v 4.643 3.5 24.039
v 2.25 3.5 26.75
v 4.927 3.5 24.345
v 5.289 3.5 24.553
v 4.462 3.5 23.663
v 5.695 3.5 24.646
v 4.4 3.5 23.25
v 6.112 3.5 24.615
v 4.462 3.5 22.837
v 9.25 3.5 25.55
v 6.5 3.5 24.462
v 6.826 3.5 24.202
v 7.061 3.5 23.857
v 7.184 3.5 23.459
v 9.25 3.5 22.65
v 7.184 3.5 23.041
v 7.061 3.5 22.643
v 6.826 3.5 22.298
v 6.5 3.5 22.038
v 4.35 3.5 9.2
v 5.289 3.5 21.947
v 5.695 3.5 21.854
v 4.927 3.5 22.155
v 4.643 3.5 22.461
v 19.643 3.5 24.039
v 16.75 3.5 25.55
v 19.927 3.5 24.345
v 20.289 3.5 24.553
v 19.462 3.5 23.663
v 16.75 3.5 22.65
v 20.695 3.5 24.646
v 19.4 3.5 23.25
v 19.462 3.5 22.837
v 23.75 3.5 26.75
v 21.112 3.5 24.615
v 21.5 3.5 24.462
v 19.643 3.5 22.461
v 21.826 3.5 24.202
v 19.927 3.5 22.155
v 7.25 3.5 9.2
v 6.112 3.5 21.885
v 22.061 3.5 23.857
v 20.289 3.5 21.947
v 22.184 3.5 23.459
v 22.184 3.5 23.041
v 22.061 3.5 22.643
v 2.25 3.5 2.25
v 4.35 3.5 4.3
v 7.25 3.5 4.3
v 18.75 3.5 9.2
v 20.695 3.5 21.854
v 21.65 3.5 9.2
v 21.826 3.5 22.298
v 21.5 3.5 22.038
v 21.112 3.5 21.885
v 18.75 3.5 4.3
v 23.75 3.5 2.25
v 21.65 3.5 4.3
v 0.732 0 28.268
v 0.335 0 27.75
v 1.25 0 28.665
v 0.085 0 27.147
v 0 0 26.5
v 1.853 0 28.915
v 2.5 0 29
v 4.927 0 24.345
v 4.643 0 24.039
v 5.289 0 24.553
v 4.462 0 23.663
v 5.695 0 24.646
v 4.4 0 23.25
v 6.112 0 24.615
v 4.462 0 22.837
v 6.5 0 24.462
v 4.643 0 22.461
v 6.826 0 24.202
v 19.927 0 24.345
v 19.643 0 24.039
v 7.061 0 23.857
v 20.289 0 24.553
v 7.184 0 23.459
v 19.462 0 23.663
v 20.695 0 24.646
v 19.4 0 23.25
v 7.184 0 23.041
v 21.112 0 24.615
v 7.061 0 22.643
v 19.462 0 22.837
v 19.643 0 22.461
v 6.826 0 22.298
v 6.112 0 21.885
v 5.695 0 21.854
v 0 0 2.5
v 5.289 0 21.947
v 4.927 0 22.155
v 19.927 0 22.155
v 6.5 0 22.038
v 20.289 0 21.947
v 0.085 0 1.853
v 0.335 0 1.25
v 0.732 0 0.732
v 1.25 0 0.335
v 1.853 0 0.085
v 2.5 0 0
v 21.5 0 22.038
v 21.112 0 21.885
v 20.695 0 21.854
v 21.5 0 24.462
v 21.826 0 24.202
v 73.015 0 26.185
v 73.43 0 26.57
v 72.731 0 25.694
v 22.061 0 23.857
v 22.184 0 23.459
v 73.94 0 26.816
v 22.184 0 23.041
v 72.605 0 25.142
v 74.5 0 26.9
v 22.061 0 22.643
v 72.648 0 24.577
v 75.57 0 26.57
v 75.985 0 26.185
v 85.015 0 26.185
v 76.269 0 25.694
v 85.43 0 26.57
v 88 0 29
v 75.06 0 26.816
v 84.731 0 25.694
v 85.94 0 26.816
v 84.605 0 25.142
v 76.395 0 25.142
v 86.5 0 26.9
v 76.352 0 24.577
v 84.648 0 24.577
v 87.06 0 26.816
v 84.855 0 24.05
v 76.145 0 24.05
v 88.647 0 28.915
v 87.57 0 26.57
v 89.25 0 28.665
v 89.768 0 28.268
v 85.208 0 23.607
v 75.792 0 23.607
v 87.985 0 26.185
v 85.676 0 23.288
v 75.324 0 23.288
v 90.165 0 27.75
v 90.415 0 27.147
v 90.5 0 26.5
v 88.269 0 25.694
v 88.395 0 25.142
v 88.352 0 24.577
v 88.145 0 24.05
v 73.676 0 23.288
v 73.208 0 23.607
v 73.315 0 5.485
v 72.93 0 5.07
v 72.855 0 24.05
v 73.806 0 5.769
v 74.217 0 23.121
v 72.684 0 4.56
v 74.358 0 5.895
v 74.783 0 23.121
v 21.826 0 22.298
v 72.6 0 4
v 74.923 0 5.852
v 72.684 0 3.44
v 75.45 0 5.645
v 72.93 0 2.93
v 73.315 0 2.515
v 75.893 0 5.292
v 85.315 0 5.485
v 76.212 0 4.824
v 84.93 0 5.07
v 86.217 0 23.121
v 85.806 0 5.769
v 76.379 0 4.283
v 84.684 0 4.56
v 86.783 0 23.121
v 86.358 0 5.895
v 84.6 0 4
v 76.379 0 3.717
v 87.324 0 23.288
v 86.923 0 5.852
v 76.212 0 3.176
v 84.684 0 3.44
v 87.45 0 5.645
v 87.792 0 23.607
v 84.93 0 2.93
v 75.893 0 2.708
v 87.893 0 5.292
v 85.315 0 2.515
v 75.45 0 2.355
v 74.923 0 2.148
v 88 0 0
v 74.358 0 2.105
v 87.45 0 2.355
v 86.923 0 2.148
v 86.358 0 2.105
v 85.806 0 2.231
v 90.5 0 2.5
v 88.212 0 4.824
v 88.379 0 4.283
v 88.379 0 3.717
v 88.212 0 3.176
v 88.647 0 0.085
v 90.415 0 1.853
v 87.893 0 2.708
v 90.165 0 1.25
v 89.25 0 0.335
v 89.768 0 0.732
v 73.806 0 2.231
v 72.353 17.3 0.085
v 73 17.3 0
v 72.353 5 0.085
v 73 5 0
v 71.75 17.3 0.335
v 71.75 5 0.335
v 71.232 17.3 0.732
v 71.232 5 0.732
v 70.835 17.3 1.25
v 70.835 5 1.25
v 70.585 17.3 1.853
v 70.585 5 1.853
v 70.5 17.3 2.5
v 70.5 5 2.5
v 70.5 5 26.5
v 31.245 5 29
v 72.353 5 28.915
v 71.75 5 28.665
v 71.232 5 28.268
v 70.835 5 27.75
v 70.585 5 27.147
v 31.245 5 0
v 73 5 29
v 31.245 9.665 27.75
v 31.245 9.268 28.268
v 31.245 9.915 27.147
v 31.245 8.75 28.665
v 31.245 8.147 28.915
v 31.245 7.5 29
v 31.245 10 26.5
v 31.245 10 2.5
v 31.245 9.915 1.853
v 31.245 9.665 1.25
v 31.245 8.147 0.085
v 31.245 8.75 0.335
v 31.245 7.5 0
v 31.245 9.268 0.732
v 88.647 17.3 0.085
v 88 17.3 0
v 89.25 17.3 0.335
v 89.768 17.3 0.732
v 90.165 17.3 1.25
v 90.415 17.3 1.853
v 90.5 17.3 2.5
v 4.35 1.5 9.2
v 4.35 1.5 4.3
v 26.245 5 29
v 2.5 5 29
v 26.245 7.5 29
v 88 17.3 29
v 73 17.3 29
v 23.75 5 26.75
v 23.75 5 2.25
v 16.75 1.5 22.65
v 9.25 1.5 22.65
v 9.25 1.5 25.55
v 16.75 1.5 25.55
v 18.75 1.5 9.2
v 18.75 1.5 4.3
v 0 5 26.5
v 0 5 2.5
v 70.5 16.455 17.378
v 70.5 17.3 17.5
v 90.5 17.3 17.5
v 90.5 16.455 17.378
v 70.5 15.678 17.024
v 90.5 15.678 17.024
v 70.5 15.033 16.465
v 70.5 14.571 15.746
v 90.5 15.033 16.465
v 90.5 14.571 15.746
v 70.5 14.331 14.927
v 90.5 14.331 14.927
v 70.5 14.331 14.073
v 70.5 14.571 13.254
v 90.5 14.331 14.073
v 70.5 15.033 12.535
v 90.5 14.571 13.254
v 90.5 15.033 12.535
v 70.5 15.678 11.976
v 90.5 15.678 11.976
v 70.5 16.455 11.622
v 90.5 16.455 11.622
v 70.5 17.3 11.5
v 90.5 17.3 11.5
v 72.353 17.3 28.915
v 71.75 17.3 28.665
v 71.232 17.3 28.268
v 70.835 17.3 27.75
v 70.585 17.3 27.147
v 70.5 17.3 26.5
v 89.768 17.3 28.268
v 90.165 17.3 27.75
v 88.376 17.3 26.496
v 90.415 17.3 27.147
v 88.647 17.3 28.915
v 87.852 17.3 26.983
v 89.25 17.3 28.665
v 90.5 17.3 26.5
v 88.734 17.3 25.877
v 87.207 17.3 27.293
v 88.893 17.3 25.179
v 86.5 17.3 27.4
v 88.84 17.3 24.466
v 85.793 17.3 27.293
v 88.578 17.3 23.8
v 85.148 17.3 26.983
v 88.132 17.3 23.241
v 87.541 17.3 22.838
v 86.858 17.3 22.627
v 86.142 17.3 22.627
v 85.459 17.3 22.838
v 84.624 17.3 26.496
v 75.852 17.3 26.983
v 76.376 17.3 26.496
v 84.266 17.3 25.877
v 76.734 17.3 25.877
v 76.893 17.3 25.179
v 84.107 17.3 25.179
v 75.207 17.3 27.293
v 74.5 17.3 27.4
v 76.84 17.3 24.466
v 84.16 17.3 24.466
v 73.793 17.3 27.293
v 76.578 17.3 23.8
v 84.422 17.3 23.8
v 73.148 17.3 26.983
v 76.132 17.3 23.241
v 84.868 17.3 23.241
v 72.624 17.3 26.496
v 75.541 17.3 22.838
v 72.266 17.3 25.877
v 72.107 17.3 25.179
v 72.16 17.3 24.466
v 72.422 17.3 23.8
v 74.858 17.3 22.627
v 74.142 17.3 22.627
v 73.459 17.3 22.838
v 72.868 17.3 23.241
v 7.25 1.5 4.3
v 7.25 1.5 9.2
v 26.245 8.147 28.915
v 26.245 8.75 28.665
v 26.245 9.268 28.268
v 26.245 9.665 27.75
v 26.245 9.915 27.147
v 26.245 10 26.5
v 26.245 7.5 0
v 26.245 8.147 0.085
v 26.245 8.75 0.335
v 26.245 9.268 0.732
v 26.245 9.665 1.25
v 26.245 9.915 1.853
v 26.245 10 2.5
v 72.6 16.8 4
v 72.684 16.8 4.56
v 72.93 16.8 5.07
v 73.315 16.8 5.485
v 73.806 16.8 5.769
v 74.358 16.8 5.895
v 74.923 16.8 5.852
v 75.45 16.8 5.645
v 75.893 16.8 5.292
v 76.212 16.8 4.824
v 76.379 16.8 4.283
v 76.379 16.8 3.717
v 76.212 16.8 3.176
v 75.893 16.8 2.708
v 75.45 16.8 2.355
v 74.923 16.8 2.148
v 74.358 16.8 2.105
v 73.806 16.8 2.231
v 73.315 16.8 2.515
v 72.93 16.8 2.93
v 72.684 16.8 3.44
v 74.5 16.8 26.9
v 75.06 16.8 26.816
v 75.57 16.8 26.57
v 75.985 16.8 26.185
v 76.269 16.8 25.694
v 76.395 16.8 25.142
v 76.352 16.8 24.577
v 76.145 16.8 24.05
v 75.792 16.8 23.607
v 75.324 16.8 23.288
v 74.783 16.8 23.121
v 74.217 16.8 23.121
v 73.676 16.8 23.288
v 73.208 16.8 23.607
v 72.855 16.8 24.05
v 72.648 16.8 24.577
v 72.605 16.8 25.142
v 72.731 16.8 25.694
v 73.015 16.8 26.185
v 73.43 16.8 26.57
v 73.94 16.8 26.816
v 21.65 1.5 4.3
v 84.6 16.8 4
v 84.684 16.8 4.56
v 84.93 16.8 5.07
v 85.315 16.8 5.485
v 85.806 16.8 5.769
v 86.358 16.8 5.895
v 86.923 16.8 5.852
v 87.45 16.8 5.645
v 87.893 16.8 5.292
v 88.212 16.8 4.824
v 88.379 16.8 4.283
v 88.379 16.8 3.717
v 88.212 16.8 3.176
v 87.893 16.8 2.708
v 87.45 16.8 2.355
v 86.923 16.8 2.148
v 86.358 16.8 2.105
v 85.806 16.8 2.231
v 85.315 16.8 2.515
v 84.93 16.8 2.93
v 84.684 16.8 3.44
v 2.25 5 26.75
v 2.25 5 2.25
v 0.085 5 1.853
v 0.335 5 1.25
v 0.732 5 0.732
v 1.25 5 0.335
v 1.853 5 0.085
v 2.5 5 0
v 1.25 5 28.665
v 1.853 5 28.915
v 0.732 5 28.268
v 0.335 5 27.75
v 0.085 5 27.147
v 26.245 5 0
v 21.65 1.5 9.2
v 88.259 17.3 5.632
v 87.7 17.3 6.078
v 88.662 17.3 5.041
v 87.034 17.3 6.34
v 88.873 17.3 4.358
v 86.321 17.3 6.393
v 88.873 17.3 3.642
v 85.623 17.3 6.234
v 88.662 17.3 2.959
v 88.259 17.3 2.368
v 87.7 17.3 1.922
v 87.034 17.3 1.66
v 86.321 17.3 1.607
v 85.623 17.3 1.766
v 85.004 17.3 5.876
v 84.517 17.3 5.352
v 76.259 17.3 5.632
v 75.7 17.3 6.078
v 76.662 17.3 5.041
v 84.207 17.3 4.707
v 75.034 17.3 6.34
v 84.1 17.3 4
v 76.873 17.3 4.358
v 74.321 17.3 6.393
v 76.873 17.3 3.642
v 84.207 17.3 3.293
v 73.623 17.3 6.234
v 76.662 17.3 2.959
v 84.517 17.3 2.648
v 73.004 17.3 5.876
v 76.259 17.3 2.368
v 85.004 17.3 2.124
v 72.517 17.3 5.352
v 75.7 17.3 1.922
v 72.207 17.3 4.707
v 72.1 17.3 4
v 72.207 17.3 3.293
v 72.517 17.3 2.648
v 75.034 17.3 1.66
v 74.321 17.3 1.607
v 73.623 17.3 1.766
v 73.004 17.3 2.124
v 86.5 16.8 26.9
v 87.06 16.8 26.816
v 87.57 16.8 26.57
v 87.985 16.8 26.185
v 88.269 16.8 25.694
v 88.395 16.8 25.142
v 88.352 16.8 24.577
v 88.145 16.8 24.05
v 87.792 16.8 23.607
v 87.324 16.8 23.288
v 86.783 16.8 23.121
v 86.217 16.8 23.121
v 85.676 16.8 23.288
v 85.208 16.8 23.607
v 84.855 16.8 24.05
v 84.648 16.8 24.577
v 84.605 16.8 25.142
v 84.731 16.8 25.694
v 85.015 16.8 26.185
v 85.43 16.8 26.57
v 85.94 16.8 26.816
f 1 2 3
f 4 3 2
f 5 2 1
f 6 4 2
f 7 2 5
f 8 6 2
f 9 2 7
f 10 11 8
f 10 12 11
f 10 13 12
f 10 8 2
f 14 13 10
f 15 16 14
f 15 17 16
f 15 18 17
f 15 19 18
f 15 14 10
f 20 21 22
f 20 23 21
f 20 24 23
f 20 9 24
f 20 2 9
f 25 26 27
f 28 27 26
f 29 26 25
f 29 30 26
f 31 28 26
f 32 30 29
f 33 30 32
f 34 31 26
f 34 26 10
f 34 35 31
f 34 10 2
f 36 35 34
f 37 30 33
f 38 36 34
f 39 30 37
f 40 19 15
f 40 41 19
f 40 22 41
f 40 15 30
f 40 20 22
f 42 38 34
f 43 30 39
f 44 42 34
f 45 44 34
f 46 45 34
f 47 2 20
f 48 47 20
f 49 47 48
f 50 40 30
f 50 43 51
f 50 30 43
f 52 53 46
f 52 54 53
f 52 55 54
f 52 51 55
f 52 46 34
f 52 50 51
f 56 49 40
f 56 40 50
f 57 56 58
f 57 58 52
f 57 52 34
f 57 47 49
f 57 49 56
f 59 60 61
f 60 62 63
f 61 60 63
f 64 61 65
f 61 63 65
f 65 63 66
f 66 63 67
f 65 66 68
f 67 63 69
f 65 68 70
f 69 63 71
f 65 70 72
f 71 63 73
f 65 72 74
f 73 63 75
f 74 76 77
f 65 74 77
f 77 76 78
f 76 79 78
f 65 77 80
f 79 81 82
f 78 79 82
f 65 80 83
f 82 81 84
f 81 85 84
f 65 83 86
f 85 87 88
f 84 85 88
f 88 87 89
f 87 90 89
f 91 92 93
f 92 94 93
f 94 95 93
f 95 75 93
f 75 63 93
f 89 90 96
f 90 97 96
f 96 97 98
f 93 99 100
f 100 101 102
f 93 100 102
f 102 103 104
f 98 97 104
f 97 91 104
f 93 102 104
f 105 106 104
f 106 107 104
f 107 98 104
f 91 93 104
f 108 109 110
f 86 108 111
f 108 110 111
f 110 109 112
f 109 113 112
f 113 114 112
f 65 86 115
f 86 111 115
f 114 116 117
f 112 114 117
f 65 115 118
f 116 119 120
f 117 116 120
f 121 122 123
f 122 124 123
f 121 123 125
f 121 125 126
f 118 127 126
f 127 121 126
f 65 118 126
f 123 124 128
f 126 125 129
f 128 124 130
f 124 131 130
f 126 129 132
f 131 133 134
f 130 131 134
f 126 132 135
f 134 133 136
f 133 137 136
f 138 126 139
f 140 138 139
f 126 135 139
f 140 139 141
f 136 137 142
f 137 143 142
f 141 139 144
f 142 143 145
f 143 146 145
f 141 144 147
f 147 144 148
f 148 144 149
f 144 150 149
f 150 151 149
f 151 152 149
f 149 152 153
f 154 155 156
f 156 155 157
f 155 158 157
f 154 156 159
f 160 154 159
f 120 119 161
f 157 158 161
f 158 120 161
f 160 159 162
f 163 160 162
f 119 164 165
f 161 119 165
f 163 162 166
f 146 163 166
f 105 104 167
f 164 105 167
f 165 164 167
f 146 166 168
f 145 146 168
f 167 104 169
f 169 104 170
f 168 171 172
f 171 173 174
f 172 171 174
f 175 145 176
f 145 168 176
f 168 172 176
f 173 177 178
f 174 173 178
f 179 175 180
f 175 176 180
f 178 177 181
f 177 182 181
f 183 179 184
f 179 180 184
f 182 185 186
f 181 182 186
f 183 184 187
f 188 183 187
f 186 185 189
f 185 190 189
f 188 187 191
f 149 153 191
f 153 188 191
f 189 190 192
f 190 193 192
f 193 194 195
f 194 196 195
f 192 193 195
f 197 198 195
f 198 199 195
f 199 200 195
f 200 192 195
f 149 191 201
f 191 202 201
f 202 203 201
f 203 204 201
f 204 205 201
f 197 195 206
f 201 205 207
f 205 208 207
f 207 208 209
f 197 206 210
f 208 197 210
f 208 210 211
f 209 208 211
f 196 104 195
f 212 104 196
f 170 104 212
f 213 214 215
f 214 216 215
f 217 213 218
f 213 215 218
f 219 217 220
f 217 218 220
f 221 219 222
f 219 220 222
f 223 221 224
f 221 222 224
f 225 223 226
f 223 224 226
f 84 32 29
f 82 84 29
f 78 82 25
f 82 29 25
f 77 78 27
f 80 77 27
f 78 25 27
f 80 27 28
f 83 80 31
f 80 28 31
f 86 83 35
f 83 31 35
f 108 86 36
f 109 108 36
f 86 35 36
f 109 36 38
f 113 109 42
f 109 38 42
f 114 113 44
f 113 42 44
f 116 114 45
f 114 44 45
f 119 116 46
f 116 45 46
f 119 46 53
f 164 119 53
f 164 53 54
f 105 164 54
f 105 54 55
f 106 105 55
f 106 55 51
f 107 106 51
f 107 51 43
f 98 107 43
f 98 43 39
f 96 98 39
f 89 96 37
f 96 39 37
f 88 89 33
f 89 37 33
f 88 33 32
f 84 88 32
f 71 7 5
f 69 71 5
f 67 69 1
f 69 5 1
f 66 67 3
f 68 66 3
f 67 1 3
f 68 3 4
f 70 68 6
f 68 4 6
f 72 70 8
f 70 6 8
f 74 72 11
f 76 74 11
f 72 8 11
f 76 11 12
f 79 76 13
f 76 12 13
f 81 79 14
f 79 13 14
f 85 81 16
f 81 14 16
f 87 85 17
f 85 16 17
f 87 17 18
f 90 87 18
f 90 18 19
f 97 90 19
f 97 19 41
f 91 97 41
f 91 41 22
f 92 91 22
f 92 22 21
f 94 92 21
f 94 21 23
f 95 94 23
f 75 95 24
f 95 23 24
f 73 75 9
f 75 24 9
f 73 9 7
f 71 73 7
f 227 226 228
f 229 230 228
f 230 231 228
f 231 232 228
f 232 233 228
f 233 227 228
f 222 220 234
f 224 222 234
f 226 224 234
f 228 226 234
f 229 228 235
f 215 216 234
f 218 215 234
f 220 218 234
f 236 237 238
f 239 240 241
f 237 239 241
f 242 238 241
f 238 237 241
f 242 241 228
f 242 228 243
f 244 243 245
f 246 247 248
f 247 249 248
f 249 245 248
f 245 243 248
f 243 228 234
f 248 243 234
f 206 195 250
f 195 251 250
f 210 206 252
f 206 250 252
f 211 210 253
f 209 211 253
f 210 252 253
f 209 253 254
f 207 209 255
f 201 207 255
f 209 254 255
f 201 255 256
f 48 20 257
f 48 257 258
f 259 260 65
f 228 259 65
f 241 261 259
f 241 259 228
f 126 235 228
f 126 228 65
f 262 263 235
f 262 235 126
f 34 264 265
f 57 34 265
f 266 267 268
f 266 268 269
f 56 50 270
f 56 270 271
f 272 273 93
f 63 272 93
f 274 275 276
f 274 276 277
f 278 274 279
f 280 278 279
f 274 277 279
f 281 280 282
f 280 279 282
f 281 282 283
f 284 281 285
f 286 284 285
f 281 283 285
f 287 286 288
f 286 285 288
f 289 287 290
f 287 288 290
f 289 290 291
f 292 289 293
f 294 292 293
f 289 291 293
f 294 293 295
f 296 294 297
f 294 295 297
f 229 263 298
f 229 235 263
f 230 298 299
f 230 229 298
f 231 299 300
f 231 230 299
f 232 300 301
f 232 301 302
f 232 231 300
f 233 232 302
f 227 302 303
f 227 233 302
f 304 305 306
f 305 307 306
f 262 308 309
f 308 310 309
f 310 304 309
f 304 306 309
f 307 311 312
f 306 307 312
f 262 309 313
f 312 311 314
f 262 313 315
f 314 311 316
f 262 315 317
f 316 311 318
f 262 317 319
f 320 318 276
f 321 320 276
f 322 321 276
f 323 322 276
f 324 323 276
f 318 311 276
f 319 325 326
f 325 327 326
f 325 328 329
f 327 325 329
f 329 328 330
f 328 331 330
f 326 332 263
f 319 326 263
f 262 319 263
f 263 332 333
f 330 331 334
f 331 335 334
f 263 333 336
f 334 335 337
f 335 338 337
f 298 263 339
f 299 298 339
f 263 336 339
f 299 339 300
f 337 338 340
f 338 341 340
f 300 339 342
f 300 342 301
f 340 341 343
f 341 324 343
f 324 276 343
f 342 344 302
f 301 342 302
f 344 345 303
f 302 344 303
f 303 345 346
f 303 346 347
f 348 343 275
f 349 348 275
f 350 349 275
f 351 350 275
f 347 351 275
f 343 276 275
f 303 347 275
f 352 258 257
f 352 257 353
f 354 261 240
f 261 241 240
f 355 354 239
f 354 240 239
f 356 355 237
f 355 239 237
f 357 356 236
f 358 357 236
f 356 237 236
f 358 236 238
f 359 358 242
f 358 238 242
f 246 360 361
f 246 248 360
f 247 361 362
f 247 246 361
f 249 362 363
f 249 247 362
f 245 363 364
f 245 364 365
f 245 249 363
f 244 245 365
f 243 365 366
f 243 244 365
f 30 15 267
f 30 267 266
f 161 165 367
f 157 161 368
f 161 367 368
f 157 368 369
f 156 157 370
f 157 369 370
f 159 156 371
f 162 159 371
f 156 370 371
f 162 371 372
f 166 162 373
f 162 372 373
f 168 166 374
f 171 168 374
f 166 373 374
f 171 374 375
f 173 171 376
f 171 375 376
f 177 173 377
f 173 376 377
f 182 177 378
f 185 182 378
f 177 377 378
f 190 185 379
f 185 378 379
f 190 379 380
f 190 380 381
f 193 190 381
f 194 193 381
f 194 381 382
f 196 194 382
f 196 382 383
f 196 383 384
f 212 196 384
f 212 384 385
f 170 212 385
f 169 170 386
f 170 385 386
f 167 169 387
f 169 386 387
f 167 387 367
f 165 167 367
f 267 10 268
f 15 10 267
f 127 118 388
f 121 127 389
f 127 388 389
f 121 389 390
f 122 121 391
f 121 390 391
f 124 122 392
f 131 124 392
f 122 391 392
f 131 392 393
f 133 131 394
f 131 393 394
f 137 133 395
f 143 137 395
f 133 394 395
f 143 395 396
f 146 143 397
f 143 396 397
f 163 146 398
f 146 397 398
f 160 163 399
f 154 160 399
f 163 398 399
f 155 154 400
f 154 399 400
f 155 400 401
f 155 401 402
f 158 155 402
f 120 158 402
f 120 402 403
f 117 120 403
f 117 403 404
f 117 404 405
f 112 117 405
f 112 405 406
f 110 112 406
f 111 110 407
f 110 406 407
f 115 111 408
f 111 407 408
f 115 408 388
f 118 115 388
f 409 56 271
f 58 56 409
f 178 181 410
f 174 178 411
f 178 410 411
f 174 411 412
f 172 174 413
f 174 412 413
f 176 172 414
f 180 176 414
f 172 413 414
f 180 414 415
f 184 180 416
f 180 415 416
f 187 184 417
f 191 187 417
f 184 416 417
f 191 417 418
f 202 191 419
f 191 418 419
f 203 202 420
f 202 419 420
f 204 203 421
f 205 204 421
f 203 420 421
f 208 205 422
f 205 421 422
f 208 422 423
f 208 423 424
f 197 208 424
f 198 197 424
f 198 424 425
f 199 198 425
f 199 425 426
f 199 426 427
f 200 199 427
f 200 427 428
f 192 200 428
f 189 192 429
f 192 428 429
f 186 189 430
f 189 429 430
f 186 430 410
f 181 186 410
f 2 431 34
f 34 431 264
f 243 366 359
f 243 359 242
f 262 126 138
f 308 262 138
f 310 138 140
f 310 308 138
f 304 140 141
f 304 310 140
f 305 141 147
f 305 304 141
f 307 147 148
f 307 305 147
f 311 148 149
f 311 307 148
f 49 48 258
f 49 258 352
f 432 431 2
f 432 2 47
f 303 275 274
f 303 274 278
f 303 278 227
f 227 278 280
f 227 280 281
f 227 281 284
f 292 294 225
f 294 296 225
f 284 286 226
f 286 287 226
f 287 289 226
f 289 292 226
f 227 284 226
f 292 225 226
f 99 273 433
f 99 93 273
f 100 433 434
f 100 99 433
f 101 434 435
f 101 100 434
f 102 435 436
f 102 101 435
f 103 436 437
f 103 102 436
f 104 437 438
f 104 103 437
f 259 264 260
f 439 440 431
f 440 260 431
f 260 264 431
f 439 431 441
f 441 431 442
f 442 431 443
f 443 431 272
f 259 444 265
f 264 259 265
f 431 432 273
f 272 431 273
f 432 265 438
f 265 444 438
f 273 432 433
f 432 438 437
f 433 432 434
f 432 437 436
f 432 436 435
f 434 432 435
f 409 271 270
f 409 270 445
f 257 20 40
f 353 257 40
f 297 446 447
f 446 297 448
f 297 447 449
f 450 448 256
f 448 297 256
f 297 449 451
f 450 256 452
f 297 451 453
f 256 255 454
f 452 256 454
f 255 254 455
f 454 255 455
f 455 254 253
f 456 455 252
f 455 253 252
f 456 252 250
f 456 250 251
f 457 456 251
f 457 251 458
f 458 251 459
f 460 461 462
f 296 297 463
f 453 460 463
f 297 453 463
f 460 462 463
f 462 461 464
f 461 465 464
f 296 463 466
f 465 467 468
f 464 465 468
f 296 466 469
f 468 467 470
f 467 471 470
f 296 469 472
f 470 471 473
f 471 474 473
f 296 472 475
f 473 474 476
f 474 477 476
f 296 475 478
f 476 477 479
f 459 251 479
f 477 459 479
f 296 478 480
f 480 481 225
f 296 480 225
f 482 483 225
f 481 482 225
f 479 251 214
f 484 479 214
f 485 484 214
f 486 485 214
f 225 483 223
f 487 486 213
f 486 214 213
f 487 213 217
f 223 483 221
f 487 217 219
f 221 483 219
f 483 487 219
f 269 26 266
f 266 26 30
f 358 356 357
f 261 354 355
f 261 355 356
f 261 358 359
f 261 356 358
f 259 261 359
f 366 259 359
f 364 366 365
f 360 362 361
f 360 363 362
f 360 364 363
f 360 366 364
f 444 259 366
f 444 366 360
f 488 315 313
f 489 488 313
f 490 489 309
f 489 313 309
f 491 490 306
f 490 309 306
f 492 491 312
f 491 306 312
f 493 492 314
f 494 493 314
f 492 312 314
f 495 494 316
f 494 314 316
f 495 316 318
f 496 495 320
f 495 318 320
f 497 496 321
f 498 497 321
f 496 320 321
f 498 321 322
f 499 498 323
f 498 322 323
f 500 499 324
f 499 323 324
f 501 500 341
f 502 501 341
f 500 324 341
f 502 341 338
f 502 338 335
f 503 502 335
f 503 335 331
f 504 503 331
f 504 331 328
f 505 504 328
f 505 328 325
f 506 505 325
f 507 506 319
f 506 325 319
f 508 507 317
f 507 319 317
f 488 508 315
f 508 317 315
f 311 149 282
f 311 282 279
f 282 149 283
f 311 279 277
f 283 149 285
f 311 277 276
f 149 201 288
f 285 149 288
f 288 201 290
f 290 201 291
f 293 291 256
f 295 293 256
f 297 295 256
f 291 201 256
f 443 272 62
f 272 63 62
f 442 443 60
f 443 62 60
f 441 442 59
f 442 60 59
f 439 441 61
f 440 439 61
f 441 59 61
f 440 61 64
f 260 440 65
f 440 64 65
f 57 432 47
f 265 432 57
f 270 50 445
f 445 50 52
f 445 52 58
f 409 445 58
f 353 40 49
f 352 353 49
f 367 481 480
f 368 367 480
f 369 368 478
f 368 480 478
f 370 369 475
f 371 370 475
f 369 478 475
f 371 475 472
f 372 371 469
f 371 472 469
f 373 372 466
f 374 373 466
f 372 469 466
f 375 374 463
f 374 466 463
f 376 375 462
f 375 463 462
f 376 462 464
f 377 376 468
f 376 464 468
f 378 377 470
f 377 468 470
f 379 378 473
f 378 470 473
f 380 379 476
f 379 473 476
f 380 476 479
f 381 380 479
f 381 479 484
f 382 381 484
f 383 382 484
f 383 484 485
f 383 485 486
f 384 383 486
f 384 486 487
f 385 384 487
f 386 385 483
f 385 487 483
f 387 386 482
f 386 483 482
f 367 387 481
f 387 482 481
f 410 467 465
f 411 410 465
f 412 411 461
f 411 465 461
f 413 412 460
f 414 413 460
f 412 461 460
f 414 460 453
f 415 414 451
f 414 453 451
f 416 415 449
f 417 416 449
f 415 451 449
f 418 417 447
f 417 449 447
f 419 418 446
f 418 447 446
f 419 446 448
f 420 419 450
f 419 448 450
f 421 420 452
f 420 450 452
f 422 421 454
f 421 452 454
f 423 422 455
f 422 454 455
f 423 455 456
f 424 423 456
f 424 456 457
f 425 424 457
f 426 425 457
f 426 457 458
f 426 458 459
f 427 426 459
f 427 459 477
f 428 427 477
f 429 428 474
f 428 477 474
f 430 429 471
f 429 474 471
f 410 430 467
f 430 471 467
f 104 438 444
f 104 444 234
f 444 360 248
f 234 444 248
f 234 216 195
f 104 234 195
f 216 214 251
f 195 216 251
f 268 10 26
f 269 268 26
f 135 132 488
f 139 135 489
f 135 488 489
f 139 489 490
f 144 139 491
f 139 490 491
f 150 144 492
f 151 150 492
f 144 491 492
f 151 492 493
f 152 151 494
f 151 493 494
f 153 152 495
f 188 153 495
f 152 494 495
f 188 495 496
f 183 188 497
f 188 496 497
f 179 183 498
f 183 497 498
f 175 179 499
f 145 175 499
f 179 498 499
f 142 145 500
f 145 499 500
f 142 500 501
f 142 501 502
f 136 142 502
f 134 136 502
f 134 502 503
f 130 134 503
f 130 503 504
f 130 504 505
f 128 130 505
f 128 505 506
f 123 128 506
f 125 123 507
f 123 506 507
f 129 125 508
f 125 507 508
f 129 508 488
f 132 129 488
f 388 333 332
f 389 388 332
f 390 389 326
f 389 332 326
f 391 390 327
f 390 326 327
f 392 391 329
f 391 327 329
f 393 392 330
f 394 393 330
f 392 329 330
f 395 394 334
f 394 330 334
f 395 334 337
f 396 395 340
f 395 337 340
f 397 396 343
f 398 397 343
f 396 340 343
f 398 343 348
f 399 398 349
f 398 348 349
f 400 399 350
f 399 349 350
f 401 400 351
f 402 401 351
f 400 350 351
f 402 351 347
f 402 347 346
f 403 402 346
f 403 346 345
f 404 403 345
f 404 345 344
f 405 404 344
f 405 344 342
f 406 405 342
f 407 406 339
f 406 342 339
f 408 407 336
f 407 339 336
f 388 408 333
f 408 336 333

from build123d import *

# Parameters (mm, degrees)
P_IDAT_VYSUNUT_M1_DEPTH  = 29
SKICA2_W                 = 21.5
SKICA2_H                 = 24.5
ODEBRAT_VYSUNUT_M1_DEPTH = 1.5
SKICA3_R                 = 1.4
ODEBRAT_VYSUNUT_M2_DEPTH = 3.5
SKICA6_W                 = 2.9
SKICA6_H                 = 4.9
SKICA6_W_2               = 7.5
SKICA6_H_2               = 2.9
ODEBRAT_VYSUNUT_M5_DEPTH = 2
ZAOBLIT1_R               = 2.5
ZAOBLIT2_R               = 2.5
SKICA10_R                = 1.9
ODEBRAT_VYSUNUT_M7_DEPTH = 17.3
SKICA20_R                = 3
ODEBRAT_VYSUNUT_M8_DEPTH = 20
ZKOSEN_1_SIZE            = 0.5
SKICA21_W                = 5
SKICA21_H                = 29
P_IDAT_VYSUNUT_M2_DEPTH  = 5
ZAOBLIT4_R               = 2.5


with BuildPart() as part:
    # Skica1 → Přidat vysunutím1 (new body)
    with BuildSketch(Plane.XY):
        Polygon((0, 0), (90.5, 0), (90.5, 17.3), (70.5, 17.3), (70.5, 5), (0, 5), align=None)
    extrude(amount=P_IDAT_VYSUNUT_M1_DEPTH)

    # Skica2 → Odebrat vysunutím1 (cut)
    with BuildSketch(Plane(origin=(0, 5, 0), x_dir=(1, 0, 0), z_dir=(0, 1, 0))):
        with Locations((13, -14.5)):
            Rectangle(SKICA2_W, SKICA2_H)
    extrude(amount=-ODEBRAT_VYSUNUT_M1_DEPTH, mode=Mode.SUBTRACT)

    # Skica3 → Odebrat vysunutím2 (cut)
    with BuildSketch(Plane(origin=(0, 3.5, 0), x_dir=(1, 0, 0), z_dir=(0, 1, 0))):
        with Locations(Location((20.8, -23.25, 0), (0, 0, 180))):
            Circle(SKICA3_R)
        with Locations(Location((5.8, -23.25, 0), (0, 0, 180))):
            Circle(SKICA3_R)
    extrude(amount=-ODEBRAT_VYSUNUT_M2_DEPTH, mode=Mode.SUBTRACT)

    # Skica6 → Odebrat vysunutím5 (cut)
    with BuildSketch(Plane(origin=(0, 3.5, 0), x_dir=(1, 0, 0), z_dir=(0, 1, 0))):
        with Locations((5.8, -6.75)):
            Rectangle(SKICA6_W, SKICA6_H)
        with Locations((20.2, -6.75)):
            Rectangle(SKICA6_W, SKICA6_H)
        with Locations((13, -24.1)):
            Rectangle(SKICA6_W_2, SKICA6_H_2)
    extrude(amount=-ODEBRAT_VYSUNUT_M5_DEPTH, mode=Mode.SUBTRACT)

    # Zaoblit1
    zaoblit1_edges = [part.edges().sort_by_distance(p)[0] for p in [
        (0, 2.5, 29),
        (0, 2.5, 0),
    ]]
    fillet(zaoblit1_edges, radius=ZAOBLIT1_R)

    # Zaoblit2
    zaoblit2_edges = [part.edges().sort_by_distance(p)[0] for p in [
        (90.5, 8.65, 29),
        (70.5, 11.15, 29),
        (70.5, 11.15, 0),
        (90.5, 8.65, 0),
    ]]
    fillet(zaoblit2_edges, radius=ZAOBLIT2_R)

    # Skica10 → Odebrat vysunutím7 (cut)
    with BuildSketch(Plane(origin=(0, 17.3, 0), x_dir=(1, 0, 0), z_dir=(0, 1, 0))):
        with Locations(Location((74.5, -4, 0), (0, 0, 180))):
            Circle(SKICA10_R)
        with Locations(Location((86.5, -4, 0), (0, 0, 180))):
            Circle(SKICA10_R)
        with Locations(Location((86.5, -25, 0), (0, 0, 270))):
            Circle(SKICA10_R)
        with Locations(Location((74.5, -25, 0), (0, 0, 270))):
            Circle(SKICA10_R)
    extrude(amount=-ODEBRAT_VYSUNUT_M7_DEPTH, mode=Mode.SUBTRACT)

    # Skica20 → Odebrat vysunutím8 (cut)
    with BuildSketch(Plane(origin=(90.5, 0, 0), x_dir=(0, 0, -1), z_dir=(1, 0, 0))):
        with Locations((-14.5, 17.3)):
            Circle(SKICA20_R)
    extrude(amount=-ODEBRAT_VYSUNUT_M8_DEPTH, mode=Mode.SUBTRACT)

    # Zkosení1
    zkosen_1_edges = [part.edges().sort_by_distance(p)[0] for p in [
        (74.5, 17.3, 23.1),
        (86.5, 17.3, 23.1),
        (88.4, 17.3, 4),
        (76.4, 17.3, 4),
    ]]
    chamfer(zkosen_1_edges, length=ZKOSEN_1_SIZE)

    # Skica21 → Přidat vysunutím2 (add)
    with BuildSketch(Plane(origin=(0, 5, 0), x_dir=(1, 0, 0), z_dir=(0, 1, 0))):
        with Locations((28.745471576, -14.5)):
            Rectangle(SKICA21_W, SKICA21_H)
    extrude(amount=P_IDAT_VYSUNUT_M2_DEPTH)

    # Zaoblit4
    zaoblit4_edges = [part.edges().sort_by_distance(p)[0] for p in [
        (28.745471576, 10, 29),
        (28.745471576, 10, 0),
    ]]
    fillet(zaoblit4_edges, radius=ZAOBLIT4_R)


solid = part.part
